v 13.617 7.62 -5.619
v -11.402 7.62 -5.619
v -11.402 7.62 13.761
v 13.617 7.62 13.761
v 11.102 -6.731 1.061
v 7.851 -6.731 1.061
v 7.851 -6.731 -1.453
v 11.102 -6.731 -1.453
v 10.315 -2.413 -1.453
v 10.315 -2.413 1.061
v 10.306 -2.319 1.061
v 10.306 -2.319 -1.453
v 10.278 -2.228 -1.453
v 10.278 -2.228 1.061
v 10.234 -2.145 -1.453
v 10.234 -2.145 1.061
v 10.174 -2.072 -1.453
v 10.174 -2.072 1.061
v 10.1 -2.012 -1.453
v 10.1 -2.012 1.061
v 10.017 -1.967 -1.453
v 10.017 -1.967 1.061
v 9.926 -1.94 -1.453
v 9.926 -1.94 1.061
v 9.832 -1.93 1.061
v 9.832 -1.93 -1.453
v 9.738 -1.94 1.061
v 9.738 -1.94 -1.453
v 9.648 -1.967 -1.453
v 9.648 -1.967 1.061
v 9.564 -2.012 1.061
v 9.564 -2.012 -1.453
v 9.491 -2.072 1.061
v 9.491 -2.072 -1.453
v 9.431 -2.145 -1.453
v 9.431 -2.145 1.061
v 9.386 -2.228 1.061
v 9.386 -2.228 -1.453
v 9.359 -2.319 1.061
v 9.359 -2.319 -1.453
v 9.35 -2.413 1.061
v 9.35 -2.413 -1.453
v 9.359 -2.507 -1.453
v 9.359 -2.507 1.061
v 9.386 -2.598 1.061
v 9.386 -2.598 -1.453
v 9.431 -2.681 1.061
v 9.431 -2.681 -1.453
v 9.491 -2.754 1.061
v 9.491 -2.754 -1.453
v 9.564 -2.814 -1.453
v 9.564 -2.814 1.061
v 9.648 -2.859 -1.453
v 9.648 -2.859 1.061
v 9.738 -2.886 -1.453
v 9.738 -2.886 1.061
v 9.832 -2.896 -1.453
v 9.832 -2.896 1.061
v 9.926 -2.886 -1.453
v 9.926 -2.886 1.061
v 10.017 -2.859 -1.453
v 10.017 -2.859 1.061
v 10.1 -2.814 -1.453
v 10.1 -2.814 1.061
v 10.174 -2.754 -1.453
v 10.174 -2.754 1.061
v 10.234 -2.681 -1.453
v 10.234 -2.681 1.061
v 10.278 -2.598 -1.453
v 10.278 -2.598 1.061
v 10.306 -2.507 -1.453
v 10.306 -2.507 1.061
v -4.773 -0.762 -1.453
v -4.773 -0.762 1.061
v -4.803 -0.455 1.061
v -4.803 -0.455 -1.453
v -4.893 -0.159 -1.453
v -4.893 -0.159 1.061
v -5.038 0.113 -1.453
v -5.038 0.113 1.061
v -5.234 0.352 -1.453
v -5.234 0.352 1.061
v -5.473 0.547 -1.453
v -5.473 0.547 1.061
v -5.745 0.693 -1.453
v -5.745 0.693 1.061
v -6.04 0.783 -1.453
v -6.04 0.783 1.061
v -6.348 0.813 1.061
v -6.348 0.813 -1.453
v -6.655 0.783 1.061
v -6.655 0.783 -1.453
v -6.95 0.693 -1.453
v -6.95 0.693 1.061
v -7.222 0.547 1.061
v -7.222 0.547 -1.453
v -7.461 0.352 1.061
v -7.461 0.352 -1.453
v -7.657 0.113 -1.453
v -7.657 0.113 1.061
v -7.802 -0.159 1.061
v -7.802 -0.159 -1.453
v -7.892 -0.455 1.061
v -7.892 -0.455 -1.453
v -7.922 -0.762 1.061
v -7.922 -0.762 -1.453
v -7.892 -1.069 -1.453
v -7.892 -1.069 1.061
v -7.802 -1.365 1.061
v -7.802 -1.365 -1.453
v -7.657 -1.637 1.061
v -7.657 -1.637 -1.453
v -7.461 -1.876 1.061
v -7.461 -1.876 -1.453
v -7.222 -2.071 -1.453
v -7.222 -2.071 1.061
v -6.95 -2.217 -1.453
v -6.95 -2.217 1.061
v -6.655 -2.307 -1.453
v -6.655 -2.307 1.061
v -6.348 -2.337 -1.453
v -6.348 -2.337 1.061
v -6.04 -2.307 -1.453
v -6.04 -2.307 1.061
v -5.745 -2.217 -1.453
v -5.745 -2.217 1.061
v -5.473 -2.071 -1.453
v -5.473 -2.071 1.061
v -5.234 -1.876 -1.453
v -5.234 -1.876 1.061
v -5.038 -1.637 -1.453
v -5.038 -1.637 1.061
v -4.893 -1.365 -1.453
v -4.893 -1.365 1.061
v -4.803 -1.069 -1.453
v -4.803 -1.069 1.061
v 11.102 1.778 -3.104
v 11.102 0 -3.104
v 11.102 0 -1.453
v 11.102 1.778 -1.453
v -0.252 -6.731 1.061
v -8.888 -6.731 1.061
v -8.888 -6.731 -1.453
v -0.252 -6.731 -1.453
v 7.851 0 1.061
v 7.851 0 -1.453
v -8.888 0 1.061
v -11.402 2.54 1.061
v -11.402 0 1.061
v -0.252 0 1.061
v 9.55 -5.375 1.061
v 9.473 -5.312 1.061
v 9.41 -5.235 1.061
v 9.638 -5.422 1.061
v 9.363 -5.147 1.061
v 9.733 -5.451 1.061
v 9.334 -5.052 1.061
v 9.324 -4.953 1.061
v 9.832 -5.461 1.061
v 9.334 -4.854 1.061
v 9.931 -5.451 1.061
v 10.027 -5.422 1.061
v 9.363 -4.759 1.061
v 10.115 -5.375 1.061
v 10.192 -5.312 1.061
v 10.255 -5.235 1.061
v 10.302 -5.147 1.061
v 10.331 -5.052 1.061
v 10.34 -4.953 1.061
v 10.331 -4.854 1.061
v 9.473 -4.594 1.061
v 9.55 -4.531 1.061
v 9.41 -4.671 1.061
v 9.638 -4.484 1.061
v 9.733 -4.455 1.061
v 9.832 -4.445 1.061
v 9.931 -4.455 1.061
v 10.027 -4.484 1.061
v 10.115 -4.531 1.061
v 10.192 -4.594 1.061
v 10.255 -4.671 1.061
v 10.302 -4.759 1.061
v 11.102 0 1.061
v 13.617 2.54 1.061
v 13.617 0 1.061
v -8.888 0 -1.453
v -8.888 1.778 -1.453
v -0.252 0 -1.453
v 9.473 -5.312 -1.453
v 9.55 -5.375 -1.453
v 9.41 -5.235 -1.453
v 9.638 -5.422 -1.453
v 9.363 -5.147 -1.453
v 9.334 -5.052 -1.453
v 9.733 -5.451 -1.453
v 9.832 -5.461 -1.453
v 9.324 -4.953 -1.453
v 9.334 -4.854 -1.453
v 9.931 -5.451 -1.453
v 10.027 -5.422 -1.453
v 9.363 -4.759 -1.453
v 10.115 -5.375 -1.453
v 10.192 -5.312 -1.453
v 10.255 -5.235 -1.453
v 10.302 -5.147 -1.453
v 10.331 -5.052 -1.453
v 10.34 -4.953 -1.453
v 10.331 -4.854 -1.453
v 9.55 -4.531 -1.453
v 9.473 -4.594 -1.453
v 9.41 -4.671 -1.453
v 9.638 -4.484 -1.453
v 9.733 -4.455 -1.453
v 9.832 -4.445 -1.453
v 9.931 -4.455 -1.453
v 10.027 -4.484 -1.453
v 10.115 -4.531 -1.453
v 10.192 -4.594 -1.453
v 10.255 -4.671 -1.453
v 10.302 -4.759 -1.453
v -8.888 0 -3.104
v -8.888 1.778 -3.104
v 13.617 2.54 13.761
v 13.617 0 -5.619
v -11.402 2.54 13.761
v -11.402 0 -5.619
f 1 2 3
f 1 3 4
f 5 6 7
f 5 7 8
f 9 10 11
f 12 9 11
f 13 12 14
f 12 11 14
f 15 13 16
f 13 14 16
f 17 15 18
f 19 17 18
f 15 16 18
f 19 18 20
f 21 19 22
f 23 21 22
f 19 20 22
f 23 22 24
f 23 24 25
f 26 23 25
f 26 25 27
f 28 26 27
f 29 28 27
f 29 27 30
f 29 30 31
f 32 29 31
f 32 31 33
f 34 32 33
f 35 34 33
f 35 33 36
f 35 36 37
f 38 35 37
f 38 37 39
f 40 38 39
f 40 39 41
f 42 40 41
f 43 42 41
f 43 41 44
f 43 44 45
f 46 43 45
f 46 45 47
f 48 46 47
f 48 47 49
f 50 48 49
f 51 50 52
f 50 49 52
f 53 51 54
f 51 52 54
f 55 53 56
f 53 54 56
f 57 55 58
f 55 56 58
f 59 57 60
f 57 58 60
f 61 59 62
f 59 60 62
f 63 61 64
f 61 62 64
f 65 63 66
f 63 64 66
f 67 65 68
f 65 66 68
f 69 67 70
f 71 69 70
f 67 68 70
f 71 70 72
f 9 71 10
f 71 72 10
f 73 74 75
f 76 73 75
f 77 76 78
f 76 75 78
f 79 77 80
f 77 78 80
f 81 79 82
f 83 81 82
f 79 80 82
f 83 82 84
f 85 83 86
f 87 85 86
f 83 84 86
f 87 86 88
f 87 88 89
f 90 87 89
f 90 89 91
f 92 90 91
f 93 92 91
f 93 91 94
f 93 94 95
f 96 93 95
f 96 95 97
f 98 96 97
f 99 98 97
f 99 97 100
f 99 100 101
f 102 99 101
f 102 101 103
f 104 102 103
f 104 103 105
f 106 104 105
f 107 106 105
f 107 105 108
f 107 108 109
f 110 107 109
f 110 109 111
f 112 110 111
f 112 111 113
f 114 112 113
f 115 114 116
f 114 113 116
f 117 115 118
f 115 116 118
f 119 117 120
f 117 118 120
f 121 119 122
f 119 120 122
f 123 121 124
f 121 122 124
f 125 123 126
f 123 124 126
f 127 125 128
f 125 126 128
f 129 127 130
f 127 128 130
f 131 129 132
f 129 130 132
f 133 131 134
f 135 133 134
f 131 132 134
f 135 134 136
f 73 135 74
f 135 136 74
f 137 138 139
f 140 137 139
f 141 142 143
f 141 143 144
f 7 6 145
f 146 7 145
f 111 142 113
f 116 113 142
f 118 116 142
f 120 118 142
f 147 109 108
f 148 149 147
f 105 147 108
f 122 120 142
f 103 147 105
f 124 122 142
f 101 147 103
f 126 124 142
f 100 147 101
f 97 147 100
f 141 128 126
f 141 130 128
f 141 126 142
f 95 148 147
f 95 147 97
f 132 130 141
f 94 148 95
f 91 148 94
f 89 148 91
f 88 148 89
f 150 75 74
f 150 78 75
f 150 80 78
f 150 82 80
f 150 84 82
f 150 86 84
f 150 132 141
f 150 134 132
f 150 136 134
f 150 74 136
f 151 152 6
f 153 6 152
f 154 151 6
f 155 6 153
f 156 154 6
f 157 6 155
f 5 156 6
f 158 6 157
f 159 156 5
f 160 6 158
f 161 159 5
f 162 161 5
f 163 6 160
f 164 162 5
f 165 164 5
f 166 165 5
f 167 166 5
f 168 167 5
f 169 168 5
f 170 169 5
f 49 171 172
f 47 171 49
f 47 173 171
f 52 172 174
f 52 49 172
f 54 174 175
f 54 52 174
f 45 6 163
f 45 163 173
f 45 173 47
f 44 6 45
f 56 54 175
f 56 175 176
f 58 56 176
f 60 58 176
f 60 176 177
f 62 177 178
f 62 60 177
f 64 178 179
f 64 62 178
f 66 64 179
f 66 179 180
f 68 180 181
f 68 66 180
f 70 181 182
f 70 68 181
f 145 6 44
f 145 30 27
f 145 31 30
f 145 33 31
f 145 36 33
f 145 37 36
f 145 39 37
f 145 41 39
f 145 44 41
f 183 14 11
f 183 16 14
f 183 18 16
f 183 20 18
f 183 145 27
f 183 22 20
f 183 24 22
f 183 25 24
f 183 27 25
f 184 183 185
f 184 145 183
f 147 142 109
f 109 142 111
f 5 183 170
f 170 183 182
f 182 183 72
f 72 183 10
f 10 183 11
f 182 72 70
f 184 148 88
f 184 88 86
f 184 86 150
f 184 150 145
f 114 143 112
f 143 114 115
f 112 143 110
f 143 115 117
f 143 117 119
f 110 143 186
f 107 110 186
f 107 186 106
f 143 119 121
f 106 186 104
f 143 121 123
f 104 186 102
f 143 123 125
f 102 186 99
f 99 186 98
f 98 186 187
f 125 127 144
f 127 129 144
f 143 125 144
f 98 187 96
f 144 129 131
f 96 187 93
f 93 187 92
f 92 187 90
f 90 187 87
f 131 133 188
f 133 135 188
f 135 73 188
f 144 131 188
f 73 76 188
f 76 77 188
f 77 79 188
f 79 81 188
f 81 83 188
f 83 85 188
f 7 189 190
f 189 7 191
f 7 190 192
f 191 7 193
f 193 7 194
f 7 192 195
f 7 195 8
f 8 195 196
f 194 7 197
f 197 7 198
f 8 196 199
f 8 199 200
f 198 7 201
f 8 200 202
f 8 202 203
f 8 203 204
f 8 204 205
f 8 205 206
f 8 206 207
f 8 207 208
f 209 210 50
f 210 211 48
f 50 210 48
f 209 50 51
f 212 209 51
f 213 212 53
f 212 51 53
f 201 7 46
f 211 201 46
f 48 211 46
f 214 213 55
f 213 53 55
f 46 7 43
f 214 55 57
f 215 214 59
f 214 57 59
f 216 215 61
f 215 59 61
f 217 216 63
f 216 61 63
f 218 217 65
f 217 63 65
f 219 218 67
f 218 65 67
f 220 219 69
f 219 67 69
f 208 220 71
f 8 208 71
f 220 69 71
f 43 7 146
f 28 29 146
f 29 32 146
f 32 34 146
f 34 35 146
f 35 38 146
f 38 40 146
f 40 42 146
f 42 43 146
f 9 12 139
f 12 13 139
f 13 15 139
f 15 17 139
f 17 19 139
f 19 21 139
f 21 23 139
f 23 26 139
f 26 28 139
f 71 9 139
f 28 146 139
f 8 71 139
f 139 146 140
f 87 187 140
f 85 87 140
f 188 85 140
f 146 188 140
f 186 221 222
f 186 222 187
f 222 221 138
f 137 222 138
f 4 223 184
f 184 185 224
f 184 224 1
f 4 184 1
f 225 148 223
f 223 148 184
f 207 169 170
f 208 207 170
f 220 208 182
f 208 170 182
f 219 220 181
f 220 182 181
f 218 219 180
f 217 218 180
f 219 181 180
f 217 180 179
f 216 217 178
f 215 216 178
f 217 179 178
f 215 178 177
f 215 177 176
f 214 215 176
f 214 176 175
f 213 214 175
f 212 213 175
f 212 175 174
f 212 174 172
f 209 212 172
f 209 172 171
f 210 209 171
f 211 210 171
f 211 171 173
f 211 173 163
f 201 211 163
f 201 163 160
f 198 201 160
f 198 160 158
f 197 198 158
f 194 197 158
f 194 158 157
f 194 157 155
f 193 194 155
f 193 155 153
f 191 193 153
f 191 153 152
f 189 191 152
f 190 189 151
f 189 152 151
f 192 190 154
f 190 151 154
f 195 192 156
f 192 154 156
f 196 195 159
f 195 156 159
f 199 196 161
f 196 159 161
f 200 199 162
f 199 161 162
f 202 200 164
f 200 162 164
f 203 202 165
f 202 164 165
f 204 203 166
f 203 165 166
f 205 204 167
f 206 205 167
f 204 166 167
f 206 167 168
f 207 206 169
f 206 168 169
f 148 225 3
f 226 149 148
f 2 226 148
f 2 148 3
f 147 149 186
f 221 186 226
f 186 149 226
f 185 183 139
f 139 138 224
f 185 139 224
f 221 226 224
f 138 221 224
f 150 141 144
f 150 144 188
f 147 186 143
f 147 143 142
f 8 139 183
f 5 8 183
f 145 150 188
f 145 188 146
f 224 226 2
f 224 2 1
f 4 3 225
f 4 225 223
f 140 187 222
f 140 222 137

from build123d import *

# Parameters (mm, degrees)
SKETCH1_W                      = 25.019
SKETCH1_H                      = 6.6802
BOSS_EXTRUDE1_DEPTH            = 7.62
SKETCH2_W                      = 19.9898
SKETCH2_H                      = 1.651
CUT_EXTRUDE1_DEPTH             = 1.778
SKETCH5_W                      = 19.9898
SKETCH5_H                      = 2.5146
BOSS_EXTRUDE2_DEPTH            = 6.731
CUT_EXTRUDE2_REACH             = 18.974
SKETCH7_W                      = 8.1026
SKETCH7_H                      = 6.731
CUT_EXTRUDE2_DIRECTION_2_DEPTH = 17.973785465
CUT_EXTRUDE5_REACH             = 18.974
SKETCH8_R                      = 1.5748
SKETCH8_R_2                    = 0.4826
SKETCH8_R_3                    = 0.508
SKETCH9_W                      = 25.019
SKETCH9_H                      = 5.08
BOSS_EXTRUDE3_DEPTH            = 12.7


with BuildPart() as part:
    # Sketch1 → Boss-Extrude1 (new body)
    with BuildSketch(Plane(origin=(0, 0, 0), x_dir=(1, 0, 0), z_dir=(0, 1, 0))):
        with Locations((1.107398361, 2.278921311)):
            Rectangle(SKETCH1_W, SKETCH1_H)
    extrude(amount=BOSS_EXTRUDE1_DEPTH)

    # Sketch2 → Cut-Extrude1 (cut)
    with BuildSketch(Plane.XZ):
        with Locations((1.107398361, -2.278921311)):
            Rectangle(SKETCH2_W, SKETCH2_H)
    extrude(amount=-CUT_EXTRUDE1_DEPTH, mode=Mode.SUBTRACT)

    # Sketch5 → Boss-Extrude2 (add)
    with BuildSketch(Plane.XZ):
        with Locations((1.107398361, -0.196121311)):
            Rectangle(SKETCH5_W, SKETCH5_H)
    extrude(amount=BOSS_EXTRUDE2_DEPTH)

    # Sketch7 → Cut-Extrude2 (cut, up to next)
    with BuildSketch(Plane.XY.offset(1.061178689), mode=Mode.PRIVATE) as cut_extrude2_sk1:
        with Locations((3.799798361, -3.3655)):
            Rectangle(SKETCH7_W, SKETCH7_H)
    cut_extrude2_tool1 = extrude(cut_extrude2_sk1.sketch, amount=-CUT_EXTRUDE2_REACH, mode=Mode.PRIVATE) & part.part
    add(cut_extrude2_tool1.solids().sort_by_distance((3.799798, -3.3655, 1.061179))[0], mode=Mode.SUBTRACT)

    # Sketch7 → Cut-Extrude2 direction 2 (cut)
    with BuildSketch(Plane.XY.offset(1.061178689)):
        with Locations((3.799798361, -3.3655)):
            Rectangle(SKETCH7_W, SKETCH7_H)
    extrude(amount=CUT_EXTRUDE2_DIRECTION_2_DEPTH, mode=Mode.SUBTRACT)

    # Sketch8 → Cut-Extrude5 (cut, up to next)
    with BuildSketch(Plane.XY.offset(1.061178689), mode=Mode.PRIVATE) as cut_extrude5_sk1:
        with Locations((-6.347501639, -0.762)):
            Circle(SKETCH8_R)
    cut_extrude5_tool1 = extrude(cut_extrude5_sk1.sketch, amount=-CUT_EXTRUDE5_REACH, mode=Mode.PRIVATE) & part.part
    # Sketch8 → Cut-Extrude5 (cut, up to next)
    with BuildSketch(Plane.XY.offset(1.061178689), mode=Mode.PRIVATE) as cut_extrude5_sk2:
        with Locations((9.832298361, -2.413)):
            Circle(SKETCH8_R_2)
    cut_extrude5_tool2 = extrude(cut_extrude5_sk2.sketch, amount=-CUT_EXTRUDE5_REACH, mode=Mode.PRIVATE) & part.part
    # Sketch8 → Cut-Extrude5 (cut, up to next)
    with BuildSketch(Plane.XY.offset(1.061178689), mode=Mode.PRIVATE) as cut_extrude5_sk3:
        with Locations((9.832298361, -4.953)):
            Circle(SKETCH8_R_3)
    cut_extrude5_tool3 = extrude(cut_extrude5_sk3.sketch, amount=-CUT_EXTRUDE5_REACH, mode=Mode.PRIVATE) & part.part
    add(cut_extrude5_tool1.solids().sort_by_distance((-6.347502, -0.762, 1.061179))[0], mode=Mode.SUBTRACT)
    add(cut_extrude5_tool2.solids().sort_by_distance((9.832298, -2.413, 1.061179))[0], mode=Mode.SUBTRACT)
    add(cut_extrude5_tool3.solids().sort_by_distance((9.832298, -4.953, 1.061179))[0], mode=Mode.SUBTRACT)

    # Sketch9 → Boss-Extrude3 (add)
    with BuildSketch(Plane.XY.offset(1.061178689)):
        with Locations((1.107398361, 5.08)):
            Rectangle(SKETCH9_W, SKETCH9_H)
    extrude(amount=BOSS_EXTRUDE3_DEPTH)


solid = part.part
